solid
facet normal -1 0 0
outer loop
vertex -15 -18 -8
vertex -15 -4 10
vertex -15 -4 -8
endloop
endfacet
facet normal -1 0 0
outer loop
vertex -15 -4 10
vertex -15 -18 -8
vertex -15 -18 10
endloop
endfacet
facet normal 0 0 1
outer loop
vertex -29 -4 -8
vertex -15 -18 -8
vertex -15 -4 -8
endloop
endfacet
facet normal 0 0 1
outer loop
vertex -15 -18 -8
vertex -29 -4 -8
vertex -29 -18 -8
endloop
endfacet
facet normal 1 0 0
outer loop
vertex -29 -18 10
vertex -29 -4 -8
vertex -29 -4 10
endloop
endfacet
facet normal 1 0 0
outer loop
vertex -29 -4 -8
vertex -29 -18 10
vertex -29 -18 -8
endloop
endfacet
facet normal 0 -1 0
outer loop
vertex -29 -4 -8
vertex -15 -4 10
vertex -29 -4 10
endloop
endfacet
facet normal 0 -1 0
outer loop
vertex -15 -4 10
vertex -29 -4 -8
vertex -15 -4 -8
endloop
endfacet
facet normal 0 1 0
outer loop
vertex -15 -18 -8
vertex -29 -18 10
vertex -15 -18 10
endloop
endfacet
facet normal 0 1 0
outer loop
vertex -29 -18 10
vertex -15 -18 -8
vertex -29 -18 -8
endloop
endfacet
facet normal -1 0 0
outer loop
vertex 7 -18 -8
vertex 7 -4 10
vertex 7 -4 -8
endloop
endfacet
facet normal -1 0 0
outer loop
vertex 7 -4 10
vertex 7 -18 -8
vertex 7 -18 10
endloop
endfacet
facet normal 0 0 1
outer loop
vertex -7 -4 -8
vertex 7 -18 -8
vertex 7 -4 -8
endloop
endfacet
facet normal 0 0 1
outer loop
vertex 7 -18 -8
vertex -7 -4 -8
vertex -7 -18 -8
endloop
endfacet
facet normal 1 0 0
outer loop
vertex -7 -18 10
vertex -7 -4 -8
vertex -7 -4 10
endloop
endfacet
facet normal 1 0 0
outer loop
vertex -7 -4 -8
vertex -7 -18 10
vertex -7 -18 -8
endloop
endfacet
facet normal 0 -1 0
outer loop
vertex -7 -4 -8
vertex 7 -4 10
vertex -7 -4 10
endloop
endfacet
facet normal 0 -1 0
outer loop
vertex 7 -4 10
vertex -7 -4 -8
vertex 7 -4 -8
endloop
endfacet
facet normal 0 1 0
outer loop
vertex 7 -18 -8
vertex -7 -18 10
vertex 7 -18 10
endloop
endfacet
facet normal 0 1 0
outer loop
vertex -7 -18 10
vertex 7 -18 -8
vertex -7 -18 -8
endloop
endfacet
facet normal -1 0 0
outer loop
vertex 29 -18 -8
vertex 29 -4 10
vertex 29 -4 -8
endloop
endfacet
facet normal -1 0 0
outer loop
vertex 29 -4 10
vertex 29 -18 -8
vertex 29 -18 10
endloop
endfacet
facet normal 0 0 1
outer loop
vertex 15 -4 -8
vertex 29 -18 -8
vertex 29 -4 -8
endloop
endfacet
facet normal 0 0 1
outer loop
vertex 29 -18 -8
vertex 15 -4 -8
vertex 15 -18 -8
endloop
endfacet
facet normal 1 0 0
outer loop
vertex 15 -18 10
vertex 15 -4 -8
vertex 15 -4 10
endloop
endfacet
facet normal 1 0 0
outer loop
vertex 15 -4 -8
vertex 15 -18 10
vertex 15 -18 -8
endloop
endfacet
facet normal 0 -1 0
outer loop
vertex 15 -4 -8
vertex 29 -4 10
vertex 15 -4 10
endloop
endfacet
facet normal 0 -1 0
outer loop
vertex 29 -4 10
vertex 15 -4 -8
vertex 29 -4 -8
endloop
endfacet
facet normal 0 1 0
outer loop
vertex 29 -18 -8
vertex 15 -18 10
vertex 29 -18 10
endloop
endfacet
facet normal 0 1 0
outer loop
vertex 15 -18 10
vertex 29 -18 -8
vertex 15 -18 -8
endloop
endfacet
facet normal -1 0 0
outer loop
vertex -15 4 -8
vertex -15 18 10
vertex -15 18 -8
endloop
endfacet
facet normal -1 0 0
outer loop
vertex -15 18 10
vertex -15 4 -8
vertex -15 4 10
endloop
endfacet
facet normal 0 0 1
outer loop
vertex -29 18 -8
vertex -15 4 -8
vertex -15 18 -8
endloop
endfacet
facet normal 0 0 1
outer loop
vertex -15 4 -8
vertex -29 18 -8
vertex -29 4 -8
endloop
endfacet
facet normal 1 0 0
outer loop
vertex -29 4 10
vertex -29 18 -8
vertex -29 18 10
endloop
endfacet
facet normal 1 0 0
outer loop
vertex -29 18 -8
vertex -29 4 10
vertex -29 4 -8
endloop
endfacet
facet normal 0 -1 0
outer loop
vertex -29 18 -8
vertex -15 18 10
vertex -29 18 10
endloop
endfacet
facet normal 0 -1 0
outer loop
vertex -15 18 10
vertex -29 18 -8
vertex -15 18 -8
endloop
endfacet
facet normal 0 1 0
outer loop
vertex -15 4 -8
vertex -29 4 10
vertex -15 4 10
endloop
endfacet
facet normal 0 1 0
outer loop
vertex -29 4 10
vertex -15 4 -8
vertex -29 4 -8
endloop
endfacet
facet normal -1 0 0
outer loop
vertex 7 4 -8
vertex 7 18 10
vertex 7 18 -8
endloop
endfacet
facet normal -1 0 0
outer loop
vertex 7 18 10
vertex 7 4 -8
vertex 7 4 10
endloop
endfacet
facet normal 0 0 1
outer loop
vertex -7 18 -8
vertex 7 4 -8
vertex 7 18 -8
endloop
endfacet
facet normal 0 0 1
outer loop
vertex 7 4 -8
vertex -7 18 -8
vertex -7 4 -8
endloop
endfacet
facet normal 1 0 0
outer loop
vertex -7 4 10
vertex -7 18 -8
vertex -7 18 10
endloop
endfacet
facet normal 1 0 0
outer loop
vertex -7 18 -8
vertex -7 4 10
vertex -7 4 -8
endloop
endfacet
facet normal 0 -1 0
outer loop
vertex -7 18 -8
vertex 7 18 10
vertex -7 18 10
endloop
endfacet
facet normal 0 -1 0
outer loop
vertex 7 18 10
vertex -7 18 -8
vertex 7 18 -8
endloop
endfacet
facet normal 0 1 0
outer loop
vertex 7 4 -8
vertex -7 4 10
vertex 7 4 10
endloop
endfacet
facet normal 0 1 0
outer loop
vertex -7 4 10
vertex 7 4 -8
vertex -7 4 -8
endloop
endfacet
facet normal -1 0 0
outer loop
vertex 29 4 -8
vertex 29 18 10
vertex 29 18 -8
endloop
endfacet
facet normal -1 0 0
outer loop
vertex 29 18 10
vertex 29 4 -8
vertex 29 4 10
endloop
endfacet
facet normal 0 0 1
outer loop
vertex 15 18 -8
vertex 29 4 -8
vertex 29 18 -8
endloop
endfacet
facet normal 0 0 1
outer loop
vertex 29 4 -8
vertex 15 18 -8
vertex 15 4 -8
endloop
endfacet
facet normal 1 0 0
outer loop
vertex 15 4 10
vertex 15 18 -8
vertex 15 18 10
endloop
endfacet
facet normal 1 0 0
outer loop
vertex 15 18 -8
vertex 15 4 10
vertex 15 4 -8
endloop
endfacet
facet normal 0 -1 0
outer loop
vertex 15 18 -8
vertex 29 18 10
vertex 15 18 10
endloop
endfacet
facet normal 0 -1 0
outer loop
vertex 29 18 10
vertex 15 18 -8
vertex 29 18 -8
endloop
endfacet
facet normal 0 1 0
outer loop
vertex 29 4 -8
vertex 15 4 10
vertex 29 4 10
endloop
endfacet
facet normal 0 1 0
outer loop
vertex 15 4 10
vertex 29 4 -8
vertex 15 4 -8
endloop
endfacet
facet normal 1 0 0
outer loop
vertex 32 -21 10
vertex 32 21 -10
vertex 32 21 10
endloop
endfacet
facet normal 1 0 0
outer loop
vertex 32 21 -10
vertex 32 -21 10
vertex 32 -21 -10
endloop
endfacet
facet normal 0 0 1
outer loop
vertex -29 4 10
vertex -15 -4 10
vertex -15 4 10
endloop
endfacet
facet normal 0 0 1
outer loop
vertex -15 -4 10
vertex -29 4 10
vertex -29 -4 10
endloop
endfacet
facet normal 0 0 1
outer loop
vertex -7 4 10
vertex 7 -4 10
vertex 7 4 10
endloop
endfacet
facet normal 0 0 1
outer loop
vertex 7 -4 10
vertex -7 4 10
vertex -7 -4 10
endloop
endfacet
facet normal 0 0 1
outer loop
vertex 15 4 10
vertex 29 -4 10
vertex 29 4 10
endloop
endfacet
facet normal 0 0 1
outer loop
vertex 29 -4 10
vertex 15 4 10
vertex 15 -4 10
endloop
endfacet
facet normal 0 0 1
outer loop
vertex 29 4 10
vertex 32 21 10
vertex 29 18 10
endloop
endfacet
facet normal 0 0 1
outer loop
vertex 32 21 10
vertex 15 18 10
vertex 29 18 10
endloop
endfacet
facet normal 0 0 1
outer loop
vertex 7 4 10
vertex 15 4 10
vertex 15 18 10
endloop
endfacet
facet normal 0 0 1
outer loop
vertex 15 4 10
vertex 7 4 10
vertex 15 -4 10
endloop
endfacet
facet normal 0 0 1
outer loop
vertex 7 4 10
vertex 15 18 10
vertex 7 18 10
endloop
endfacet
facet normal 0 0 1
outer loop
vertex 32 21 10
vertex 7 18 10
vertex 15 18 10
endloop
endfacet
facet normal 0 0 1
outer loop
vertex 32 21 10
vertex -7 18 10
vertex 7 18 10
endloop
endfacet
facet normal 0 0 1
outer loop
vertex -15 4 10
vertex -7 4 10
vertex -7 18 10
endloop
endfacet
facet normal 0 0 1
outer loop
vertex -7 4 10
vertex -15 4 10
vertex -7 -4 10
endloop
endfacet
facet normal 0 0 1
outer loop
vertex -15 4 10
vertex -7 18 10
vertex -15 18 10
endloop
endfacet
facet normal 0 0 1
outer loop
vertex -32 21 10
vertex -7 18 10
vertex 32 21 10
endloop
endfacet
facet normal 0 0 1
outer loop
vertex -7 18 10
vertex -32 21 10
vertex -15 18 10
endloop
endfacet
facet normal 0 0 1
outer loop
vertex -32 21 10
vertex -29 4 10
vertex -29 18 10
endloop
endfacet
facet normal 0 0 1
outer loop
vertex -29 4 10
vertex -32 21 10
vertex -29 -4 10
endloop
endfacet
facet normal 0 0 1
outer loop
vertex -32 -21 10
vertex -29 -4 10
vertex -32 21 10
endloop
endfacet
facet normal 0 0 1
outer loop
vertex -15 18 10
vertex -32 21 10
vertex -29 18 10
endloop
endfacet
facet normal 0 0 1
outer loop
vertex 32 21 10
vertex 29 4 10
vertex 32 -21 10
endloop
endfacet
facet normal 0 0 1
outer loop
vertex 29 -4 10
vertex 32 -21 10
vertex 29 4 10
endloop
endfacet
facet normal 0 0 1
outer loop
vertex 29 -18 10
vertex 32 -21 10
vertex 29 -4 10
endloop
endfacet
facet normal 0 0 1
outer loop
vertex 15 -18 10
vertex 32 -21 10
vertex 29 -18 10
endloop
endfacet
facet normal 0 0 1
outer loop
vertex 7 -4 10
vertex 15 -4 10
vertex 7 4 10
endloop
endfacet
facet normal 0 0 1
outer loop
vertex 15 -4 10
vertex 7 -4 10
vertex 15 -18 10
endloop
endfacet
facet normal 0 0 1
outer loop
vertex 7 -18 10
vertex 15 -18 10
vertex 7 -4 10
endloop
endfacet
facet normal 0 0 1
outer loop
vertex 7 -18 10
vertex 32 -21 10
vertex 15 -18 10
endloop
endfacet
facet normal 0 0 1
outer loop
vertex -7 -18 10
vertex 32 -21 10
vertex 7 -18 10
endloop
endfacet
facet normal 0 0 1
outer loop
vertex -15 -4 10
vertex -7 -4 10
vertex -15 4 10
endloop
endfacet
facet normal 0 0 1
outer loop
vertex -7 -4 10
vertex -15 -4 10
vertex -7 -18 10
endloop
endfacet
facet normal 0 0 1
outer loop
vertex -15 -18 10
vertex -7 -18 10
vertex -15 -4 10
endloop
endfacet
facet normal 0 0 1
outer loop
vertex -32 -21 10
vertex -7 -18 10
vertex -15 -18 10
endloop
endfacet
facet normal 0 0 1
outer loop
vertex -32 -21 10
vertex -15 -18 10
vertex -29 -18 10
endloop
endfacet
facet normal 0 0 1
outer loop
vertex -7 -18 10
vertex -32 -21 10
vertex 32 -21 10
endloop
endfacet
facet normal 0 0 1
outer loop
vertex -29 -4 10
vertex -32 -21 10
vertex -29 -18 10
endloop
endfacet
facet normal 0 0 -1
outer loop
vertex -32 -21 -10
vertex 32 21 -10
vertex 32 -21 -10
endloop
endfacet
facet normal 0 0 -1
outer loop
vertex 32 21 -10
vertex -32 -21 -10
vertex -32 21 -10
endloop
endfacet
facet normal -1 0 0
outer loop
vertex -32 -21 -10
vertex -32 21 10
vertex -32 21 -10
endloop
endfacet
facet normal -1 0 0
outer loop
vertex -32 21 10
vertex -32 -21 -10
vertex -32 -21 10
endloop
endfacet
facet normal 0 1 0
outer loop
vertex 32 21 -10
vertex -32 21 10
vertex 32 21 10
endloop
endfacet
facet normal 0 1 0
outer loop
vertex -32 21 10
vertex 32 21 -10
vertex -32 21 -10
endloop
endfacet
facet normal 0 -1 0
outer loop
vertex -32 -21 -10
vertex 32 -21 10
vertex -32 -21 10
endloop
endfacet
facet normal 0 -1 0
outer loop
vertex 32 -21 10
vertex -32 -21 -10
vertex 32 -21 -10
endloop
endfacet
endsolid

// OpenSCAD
$fn = 32;

// ----------------------------------------------------------------------
// Pocket plate 64 x 42 x 20
// 2 x 3 pockets 14 mm square, 18 mm deep
// ----------------------------------------------------------------------

// --- parameters (mm) ---
thickness = 20;  // plate thickness
floor_t = 2;     // material left under each pocket
pocket = 14;     // pocket side length
pitch_x = 22;    // pocket pitch along X
pitch_y = 22;    // pocket pitch along Y
cols = 3;        // pockets per row
rows = 2;        // rows of pockets

// --- derived feature positions (mm) ---
depth = thickness - floor_t;        // = 18   pocket depth, down to the floor
span_x = (cols - 1) * pitch_x;      // = 44   distance between outer pockets
span_y = (rows - 1) * pitch_y;      // = 22   distance between outer pocket rows
origin_x = -span_x / 2;             // = -22   X of the first pocket
origin_y = -span_y / 2;             // = -11   Y of the first pocket
plate = [span_x + pocket + 6, span_y + pocket + 6, thickness];  // = [64, 42, 20]   overall size: pockets plus 3 mm of wall on each side
feature_centers = [
  [origin_x + 0 * pitch_x, origin_y + 0 * pitch_y],
  [origin_x + 1 * pitch_x, origin_y + 0 * pitch_y],
  [origin_x + 2 * pitch_x, origin_y + 0 * pitch_y],
  [origin_x + 0 * pitch_x, origin_y + 1 * pitch_y],
  [origin_x + 1 * pitch_x, origin_y + 1 * pitch_y],
  [origin_x + 2 * pitch_x, origin_y + 1 * pitch_y]
];   // pocket centres, used verbatim by the cutter loop

// plate outline, then one pocket per centre in feature_centers
difference() {
  cube(plate, center = true);
  for (centre = feature_centers)
    translate([centre[0] - pocket / 2, centre[1] - pocket / 2, plate[2] / 2 - depth])
      cube([pocket, pocket, depth + 1]);  // centred on the declared pocket centre
}
